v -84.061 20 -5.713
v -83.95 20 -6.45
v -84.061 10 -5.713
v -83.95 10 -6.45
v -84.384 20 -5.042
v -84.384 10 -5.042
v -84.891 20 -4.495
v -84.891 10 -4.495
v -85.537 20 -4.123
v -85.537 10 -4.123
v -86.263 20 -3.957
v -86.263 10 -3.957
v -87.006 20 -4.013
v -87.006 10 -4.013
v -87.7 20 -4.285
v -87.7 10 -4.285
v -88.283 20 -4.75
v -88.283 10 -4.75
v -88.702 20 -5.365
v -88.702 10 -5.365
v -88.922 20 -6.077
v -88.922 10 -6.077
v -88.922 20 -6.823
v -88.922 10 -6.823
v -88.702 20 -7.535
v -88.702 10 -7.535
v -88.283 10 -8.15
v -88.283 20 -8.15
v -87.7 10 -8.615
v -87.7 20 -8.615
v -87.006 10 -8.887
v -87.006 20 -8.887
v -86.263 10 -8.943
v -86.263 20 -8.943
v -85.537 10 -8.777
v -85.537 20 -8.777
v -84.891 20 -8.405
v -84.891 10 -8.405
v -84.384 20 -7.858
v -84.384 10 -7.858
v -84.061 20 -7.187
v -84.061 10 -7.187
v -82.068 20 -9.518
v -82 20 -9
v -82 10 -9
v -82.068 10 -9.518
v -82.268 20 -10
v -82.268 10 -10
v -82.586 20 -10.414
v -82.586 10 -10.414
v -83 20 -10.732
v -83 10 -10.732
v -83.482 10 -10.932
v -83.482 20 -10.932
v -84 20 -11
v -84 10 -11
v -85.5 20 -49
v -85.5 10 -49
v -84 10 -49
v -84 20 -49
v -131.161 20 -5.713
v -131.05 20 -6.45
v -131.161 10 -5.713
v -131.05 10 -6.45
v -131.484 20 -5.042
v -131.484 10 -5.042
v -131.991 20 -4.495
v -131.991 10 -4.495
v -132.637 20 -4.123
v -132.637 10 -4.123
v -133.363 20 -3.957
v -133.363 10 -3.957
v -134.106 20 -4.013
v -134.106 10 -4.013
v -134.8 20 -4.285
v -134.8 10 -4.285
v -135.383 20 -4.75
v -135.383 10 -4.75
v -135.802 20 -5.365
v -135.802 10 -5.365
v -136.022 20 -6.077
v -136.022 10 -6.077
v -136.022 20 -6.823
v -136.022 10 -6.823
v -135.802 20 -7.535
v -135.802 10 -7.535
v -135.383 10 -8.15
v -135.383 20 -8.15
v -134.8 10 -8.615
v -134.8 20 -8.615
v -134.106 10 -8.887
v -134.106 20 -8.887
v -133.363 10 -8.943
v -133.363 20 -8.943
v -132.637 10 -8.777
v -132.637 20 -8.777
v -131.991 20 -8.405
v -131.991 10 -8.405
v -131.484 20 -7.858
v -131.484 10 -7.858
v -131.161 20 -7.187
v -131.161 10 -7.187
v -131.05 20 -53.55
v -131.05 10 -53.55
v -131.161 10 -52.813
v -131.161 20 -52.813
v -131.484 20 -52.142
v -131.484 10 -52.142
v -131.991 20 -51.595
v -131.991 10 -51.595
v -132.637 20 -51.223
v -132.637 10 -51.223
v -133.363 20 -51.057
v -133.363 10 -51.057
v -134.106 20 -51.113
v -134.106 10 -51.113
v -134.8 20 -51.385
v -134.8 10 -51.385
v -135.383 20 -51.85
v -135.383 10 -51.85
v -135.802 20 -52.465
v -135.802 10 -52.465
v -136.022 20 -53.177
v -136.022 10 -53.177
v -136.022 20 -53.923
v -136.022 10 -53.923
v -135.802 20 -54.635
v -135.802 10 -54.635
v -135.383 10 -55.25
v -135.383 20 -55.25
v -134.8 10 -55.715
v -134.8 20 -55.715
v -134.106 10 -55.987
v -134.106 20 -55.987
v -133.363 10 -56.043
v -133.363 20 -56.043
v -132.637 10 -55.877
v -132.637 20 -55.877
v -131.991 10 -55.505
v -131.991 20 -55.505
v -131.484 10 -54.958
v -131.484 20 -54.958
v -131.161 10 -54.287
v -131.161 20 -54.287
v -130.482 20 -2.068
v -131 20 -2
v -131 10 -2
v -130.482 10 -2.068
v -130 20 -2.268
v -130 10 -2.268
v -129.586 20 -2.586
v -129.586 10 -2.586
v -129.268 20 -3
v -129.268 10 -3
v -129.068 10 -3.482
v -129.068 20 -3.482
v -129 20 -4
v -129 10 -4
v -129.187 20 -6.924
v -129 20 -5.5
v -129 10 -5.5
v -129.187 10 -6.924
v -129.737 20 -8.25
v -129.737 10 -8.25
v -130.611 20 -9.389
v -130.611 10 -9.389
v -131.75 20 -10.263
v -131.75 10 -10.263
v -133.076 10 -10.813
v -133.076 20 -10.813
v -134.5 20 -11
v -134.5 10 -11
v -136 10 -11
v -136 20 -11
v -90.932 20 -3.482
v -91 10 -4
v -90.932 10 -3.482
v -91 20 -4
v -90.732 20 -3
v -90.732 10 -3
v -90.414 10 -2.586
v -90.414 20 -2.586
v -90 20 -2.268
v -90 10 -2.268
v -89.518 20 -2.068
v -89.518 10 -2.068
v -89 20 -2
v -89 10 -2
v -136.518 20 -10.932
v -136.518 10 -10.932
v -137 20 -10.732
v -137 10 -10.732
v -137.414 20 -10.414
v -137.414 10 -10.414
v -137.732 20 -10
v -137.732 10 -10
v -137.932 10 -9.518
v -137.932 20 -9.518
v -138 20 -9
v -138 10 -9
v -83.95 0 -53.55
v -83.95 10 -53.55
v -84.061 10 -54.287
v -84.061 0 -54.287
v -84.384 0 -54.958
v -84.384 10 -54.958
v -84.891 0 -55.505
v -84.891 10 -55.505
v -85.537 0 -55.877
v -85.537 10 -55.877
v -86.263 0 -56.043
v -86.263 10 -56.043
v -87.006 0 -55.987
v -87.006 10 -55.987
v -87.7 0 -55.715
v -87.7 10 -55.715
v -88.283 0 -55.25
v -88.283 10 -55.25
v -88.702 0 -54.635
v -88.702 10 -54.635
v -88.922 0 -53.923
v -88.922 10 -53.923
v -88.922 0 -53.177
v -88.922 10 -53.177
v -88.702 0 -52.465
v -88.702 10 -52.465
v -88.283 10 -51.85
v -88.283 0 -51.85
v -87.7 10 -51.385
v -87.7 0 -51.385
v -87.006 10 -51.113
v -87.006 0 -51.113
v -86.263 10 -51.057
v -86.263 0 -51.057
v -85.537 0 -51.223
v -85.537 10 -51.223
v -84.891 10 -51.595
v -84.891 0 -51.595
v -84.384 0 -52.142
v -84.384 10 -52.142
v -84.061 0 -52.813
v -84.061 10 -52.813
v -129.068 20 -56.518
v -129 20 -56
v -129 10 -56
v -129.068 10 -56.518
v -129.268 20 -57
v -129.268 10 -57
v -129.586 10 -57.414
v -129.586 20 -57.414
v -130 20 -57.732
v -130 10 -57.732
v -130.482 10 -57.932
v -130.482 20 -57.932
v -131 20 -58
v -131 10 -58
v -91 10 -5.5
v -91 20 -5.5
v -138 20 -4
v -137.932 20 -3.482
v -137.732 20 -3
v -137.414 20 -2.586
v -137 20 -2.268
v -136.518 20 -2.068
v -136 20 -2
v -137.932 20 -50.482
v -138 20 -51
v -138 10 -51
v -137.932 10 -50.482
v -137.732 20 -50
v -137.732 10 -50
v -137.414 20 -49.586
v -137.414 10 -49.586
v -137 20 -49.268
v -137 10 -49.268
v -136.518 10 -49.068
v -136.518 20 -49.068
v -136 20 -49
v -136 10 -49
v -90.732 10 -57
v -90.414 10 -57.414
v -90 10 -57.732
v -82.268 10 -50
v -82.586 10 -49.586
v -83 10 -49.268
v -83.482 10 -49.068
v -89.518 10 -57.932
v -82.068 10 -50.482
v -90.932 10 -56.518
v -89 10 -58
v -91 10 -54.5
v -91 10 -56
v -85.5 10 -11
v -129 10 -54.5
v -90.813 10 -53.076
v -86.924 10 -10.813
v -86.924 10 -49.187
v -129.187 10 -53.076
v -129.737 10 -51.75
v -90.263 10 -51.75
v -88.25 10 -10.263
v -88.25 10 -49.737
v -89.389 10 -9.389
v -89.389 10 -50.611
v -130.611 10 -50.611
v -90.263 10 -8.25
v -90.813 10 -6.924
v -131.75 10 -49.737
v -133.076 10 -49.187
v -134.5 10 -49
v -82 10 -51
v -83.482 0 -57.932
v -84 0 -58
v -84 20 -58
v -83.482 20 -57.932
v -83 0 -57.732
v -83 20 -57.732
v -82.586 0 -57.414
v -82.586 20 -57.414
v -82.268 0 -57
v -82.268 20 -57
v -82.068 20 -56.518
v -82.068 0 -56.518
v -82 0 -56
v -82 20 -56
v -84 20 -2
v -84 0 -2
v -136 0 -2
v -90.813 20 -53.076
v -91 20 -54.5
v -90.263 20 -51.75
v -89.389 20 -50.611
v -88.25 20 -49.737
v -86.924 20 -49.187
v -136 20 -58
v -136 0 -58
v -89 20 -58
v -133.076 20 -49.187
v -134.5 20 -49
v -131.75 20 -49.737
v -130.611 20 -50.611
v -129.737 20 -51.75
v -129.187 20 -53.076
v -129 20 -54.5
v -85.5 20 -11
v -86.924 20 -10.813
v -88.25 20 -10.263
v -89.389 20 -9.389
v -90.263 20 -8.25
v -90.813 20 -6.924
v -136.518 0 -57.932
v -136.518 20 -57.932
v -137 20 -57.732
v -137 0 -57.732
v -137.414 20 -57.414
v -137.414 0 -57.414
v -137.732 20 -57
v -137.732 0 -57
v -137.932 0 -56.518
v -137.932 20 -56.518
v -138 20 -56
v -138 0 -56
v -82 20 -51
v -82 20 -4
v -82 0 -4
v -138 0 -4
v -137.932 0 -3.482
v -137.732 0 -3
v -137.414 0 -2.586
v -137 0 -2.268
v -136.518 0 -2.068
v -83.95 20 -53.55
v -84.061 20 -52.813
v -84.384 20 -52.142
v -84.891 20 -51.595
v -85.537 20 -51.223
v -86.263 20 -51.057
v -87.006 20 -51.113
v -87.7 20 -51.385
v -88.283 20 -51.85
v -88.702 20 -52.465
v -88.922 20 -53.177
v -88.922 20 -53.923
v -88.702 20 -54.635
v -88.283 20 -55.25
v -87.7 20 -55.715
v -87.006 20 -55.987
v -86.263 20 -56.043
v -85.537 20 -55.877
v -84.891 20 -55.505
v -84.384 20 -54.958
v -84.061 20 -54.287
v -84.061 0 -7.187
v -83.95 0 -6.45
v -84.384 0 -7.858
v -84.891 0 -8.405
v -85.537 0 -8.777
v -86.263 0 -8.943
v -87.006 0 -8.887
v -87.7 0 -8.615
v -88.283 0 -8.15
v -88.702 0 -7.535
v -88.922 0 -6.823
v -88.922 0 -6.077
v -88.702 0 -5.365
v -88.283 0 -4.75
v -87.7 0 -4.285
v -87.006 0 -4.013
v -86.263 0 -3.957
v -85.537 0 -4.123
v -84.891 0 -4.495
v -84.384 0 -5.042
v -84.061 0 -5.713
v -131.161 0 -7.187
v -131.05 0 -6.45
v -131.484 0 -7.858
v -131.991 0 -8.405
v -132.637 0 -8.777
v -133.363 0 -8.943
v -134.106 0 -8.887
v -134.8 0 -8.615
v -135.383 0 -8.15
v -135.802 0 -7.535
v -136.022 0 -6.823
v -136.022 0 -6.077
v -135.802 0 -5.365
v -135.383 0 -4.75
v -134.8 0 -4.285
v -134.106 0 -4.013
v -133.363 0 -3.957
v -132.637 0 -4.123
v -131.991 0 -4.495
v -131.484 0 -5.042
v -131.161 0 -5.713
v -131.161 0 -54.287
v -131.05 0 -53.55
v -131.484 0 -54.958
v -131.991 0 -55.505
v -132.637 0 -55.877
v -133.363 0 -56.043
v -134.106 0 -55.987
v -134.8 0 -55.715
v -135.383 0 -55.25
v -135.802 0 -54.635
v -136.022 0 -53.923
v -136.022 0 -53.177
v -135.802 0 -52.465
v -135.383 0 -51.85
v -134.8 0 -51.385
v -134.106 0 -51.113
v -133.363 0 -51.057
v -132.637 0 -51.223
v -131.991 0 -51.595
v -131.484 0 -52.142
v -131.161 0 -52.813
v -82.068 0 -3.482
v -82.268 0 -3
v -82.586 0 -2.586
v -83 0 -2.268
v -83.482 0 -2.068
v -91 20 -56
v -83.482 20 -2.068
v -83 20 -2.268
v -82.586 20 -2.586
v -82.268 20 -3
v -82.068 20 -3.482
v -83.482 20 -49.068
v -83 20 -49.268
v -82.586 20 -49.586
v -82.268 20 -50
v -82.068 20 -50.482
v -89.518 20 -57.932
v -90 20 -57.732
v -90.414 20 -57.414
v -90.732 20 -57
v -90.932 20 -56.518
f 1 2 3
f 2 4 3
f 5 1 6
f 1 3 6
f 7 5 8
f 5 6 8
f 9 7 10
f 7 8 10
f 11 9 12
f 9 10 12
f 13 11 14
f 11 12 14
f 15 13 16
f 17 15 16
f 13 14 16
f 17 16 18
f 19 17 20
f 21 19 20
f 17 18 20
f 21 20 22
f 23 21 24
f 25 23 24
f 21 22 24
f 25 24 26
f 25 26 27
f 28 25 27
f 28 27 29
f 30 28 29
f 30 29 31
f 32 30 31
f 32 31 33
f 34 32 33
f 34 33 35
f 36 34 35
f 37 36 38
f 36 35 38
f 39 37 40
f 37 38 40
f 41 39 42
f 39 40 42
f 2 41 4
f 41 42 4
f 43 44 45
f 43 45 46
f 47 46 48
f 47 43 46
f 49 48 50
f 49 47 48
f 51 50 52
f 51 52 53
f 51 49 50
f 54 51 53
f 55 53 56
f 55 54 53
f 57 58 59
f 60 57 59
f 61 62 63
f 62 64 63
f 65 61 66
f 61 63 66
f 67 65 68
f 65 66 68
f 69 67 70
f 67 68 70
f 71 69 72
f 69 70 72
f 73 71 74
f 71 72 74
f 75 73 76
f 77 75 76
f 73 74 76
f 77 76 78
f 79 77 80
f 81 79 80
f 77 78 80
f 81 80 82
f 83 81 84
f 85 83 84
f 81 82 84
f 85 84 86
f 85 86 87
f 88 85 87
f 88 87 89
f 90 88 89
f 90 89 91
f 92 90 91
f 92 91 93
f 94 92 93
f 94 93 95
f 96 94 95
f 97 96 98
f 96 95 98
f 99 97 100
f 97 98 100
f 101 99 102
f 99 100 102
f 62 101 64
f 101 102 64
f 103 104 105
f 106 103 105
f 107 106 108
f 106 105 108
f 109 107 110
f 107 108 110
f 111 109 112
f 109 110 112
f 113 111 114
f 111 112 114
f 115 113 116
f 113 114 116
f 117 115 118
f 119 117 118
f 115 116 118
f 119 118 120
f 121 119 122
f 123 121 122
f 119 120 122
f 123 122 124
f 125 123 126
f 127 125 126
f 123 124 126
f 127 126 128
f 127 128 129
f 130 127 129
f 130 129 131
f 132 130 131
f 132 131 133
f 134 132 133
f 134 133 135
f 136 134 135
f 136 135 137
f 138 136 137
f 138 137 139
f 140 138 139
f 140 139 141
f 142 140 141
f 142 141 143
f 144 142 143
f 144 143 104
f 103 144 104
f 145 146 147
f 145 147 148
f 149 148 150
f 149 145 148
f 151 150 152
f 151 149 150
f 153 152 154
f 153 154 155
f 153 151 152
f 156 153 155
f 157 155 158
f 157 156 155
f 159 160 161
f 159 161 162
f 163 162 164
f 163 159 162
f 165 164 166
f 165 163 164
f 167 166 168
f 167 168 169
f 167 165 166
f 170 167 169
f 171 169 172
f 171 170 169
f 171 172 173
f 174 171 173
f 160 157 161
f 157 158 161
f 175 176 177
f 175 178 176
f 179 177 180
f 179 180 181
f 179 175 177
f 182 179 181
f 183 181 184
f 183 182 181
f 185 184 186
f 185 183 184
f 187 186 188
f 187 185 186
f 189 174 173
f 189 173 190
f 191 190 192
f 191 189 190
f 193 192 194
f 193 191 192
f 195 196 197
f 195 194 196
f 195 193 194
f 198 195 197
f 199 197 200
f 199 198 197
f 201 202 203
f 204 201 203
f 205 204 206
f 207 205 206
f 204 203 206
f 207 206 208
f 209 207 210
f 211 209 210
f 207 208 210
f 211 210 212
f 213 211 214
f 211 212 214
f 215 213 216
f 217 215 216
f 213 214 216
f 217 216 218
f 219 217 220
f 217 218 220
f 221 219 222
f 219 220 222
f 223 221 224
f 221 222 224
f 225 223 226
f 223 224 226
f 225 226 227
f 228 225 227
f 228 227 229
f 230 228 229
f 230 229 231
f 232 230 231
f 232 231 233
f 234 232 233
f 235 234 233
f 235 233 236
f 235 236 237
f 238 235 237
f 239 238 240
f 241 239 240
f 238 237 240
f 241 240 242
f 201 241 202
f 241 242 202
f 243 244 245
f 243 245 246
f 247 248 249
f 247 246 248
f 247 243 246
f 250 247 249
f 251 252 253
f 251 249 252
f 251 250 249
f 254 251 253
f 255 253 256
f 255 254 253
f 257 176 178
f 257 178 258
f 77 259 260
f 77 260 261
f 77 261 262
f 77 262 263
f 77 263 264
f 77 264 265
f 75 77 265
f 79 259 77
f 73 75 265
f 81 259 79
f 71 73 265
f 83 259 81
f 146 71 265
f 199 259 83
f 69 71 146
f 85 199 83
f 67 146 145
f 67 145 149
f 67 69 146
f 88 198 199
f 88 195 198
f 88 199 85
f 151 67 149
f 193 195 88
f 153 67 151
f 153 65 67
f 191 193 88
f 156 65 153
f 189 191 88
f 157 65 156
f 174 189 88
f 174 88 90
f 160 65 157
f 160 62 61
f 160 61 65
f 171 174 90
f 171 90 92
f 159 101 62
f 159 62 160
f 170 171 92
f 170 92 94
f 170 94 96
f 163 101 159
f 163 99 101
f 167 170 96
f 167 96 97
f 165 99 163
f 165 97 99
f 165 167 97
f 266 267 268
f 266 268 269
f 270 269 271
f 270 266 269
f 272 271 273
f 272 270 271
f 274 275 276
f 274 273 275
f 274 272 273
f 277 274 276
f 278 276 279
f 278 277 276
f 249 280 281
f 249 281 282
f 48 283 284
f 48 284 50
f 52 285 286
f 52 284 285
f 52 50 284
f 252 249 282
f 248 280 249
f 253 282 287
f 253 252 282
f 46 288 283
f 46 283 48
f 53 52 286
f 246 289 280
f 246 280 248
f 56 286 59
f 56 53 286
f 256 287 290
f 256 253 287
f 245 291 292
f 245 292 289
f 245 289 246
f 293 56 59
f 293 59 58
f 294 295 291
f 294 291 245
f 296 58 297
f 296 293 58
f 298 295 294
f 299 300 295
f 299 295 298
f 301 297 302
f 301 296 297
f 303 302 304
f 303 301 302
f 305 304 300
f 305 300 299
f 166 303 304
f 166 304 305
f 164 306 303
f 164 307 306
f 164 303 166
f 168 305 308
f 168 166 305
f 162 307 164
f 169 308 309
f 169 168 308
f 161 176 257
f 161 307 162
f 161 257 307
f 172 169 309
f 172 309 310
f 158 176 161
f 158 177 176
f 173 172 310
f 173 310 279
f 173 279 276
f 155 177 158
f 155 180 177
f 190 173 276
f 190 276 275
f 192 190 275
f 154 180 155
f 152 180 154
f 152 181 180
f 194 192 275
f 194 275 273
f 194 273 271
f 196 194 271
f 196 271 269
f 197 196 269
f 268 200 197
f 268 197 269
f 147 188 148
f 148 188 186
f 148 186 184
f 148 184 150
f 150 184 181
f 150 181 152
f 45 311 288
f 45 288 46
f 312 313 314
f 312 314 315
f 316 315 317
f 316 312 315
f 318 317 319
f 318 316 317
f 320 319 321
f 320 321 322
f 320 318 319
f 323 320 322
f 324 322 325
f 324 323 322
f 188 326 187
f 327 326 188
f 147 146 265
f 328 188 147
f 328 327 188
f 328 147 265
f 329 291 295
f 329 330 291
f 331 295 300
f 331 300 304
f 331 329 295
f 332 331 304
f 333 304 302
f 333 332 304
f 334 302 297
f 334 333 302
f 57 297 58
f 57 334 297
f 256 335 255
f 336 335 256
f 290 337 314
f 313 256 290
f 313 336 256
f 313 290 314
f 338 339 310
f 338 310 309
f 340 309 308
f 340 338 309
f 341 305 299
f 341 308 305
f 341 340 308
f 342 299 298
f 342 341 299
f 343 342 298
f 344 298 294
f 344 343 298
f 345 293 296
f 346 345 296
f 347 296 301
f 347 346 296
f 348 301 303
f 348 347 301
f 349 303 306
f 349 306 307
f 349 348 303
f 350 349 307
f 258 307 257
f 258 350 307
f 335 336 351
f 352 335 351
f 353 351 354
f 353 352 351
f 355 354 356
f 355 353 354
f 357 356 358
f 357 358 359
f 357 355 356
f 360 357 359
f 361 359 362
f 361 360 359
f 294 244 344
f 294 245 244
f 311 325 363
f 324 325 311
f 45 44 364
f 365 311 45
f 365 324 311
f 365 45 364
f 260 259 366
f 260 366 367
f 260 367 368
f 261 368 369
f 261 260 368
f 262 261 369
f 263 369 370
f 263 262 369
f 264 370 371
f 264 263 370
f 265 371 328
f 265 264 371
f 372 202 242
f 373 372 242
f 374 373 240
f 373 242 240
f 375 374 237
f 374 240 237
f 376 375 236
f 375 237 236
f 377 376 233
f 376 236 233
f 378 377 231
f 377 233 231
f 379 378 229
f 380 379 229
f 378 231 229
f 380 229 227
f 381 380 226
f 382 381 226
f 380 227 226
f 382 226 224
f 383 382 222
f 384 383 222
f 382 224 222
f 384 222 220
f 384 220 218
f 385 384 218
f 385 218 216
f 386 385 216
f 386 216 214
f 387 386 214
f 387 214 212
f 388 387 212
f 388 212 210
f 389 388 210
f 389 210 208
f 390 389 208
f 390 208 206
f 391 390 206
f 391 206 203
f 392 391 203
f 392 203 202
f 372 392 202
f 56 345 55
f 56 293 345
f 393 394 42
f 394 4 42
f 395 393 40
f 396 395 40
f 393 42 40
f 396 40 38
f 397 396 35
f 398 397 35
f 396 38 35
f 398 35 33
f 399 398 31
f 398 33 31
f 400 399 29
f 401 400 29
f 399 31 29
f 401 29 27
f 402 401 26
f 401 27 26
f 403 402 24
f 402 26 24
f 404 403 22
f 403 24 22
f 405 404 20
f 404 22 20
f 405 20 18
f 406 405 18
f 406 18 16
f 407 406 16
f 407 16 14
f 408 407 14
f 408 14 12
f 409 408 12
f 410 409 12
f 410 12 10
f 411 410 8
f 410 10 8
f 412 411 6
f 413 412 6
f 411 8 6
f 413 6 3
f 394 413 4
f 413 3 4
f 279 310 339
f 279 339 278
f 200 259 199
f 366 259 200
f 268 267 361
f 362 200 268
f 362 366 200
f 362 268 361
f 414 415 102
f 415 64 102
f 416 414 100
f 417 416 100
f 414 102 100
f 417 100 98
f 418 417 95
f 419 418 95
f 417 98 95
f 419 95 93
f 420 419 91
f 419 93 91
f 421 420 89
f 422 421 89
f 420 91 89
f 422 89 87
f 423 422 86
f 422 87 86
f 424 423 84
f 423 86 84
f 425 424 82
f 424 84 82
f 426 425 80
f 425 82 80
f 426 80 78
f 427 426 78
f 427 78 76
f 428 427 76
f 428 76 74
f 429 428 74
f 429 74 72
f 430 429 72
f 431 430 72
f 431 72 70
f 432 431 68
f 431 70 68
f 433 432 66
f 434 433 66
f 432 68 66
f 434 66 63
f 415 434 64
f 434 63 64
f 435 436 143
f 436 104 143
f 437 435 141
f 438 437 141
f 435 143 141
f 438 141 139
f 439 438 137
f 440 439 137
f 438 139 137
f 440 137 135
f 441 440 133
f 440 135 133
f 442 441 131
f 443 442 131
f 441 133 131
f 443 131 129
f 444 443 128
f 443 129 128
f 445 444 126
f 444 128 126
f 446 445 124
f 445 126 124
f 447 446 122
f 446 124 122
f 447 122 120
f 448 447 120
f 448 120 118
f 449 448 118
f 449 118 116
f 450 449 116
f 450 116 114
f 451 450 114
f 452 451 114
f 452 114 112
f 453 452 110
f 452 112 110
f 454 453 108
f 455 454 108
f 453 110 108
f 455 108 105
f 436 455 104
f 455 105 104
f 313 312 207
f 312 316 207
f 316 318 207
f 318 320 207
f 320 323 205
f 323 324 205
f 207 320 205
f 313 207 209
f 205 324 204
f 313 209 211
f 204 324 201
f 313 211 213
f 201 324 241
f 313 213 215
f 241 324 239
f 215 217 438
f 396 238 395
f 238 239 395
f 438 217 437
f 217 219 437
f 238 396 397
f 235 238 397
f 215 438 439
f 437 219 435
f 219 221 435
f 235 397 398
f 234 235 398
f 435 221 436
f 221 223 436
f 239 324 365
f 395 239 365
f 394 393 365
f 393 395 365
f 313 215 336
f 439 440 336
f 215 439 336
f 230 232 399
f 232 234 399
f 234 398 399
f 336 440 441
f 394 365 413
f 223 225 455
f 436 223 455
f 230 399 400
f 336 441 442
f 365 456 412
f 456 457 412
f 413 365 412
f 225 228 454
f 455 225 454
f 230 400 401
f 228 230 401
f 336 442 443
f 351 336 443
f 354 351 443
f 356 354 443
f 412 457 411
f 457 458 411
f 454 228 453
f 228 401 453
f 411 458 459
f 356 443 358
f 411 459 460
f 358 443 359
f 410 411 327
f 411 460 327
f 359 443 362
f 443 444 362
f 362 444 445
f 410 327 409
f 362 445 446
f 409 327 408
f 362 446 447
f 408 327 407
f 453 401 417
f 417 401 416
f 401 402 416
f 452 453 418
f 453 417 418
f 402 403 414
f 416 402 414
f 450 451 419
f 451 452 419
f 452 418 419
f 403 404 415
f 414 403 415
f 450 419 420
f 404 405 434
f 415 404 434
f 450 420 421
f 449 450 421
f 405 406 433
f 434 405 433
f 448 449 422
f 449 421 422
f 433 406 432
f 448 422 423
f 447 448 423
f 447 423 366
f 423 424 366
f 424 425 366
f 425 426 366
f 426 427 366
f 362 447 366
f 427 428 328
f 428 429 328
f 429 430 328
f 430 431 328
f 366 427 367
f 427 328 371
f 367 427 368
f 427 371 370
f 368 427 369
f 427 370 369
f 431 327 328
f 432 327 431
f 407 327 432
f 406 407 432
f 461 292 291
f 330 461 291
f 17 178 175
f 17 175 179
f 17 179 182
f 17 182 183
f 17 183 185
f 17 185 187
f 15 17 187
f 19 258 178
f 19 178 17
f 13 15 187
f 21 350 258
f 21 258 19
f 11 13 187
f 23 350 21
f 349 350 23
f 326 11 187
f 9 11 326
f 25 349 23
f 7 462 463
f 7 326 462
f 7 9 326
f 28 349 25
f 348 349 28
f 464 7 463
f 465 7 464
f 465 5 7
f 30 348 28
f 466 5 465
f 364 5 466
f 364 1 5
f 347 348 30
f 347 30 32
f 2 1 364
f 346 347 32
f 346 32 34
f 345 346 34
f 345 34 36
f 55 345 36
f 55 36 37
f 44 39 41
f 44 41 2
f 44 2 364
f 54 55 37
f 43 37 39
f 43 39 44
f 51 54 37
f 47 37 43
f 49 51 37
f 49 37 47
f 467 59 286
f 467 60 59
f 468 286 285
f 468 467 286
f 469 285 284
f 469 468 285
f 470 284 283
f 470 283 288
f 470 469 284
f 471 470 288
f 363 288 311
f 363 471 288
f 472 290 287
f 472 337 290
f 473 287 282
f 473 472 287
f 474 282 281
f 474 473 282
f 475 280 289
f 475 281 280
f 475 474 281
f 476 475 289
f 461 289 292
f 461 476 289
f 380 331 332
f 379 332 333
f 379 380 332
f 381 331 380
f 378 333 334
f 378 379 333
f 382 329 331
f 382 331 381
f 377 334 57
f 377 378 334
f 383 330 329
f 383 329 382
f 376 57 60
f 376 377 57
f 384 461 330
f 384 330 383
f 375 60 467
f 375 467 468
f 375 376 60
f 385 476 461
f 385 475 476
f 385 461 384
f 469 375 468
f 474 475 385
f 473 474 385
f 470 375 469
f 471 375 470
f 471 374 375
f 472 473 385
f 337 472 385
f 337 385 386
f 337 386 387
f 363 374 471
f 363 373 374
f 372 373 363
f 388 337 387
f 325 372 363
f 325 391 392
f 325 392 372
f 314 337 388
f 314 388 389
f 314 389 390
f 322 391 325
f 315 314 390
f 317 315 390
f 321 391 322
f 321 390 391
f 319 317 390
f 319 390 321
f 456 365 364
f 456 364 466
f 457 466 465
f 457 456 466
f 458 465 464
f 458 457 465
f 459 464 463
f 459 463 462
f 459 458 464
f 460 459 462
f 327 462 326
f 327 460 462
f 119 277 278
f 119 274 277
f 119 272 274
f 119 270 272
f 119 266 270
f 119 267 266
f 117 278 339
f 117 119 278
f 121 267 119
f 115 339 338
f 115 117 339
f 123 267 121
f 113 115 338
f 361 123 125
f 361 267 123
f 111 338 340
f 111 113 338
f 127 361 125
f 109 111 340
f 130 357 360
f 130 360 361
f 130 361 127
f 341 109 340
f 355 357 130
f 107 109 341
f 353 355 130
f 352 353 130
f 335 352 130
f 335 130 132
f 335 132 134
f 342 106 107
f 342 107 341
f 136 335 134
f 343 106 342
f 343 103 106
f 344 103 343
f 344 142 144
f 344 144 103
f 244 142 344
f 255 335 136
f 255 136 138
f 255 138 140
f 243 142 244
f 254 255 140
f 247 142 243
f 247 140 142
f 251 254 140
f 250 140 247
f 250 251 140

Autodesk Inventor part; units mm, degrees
ref_plane "YZ Plane" through (0, 0, 0) normal (1, 0, 0) x (0, 1, 0)
ref_plane "XZ Plane" through (0, 0, 0) normal (0, 1, 0) x (-1, 0, 0)
ref_plane "XY Plane" through (0, 0, 0) normal (0, 0, 1) x (1, 0, 0)
sketch "Sketch1" plane through (0, 0, 0) normal (0, 1, 0) x (-1, 0, 0)
  line L0 (140, 0) -> (74, 0)
  line L1 (74, 0) -> (76, 0)
  line L2 (140, 0) -> (140, -60)
  line L3 (140, -60) -> (140, 0)
  line L4 (138, -58) -> (82, -2)
  line L5 (82, -58) -> (138, -2)
  circle A0 centre (110, -30) radius 19.4
  circle A1 centre (104, -30) radius 19.4
  line L6 (110, -30) -> (110, -49.4)
  line L7 (86.45, -6.45) -> (86.45, -53.55)
  line L8 (82, -58) -> (82, -2)
  line L9 (76, -58) -> (76, -2)
  line L10 (74, 0) -> (74, -60)
  line L11 (74, 0) -> (74, -60)
  circle A2 centre (86.45, -6.45) radius 2.5
  line L12 (76, -2) -> (138, -2)
  line L13 (80.45, -8.95) -> (133.55, -8.95)
  line L14 (80.45, -3.95) -> (133.55, -3.95)
  line L15 (133.55, -6.45) -> (86.45, -6.45)
  line L16 (82, -2) -> (138, -2)
  line L17 (104, -10.6) -> (110, -10.6)
  line L18 (138, -2) -> (138, -58)
  line L19 (138, -2) -> (138, -58)
  line L20 (133.55, -53.55) -> (133.55, -6.45)
  line L21 (140, -60) -> (138, -60)
  line L22 (138, -60) -> (138, -58)
  line L23 (138, -58) -> (140, -58)
  line L24 (140, -58) -> (140, -60)
  line L25 (104, -49.4) -> (110, -49.4)
  circle A3 centre (86.45, -53.55) radius 2.5
  line L26 (133.55, -51.05) -> (80.45, -51.05)
  line L27 (86.45, -53.55) -> (133.55, -53.55)
  line L28 (80.45, -56.05) -> (133.55, -56.05)
  line L29 (138, -58) -> (82, -58)
  line L30 (138, -58) -> (76, -58)
  line L31 (74, -60) -> (140, -60)
  line L32 (140, -60) -> (32, -60)
  circle A4 centre (127.55, -53.55) radius 2.5
  line L33 (104, -30) -> (104, -49.4)
  circle A5 centre (80.45, -6.45) radius 2.5
  line L34 (86.45, -53.55) -> (82, -53.55)
  line L35 (82, -58) -> (86.45, -58)
  line L36 (86.45, -58) -> (86.45, -53.55)
  line L37 (82, -53.55) -> (82, -58)
  circle A6 centre (80.45, -53.55) radius 2.5
  circle A7 centre (133.55, -53.55) radius 2.5
  line L38 (76, 0) -> (76, -2)
  line L39 (76, -2) -> (74, -2)
  line L40 (74, -2) -> (74, 0)
  line L41 (138, -2) -> (133.55, -2)
  line L42 (133.55, -2) -> (133.55, -6.45)
  line L43 (133.55, -6.45) -> (138, -6.45)
  line L44 (138, -6.45) -> (138, -2)
  circle A8 centre (127.55, -6.45) radius 2.5
  circle A9 centre (133.55, -6.45) radius 2.5
  line L45 (0, -25) -> (0, 0)
  line L46 (32, -60) -> (0, -25)
  line L47 (0, -25) -> (0, 0)
  line L48 (0, 0) -> (74, 0)
  line L49 (0, 0) -> (74, 0)
  line L50 (140, -60) -> (140, 0)
  line L51 (140, -60) -> (0, -60)
  line L52 (0, -60) -> (0, 0)
  line L53 (0, 0) -> (140, 0)
  line L54 (140, 0) -> (140, -60)
  line L55 (0, -60) -> (40, -60)
  line L56 (40, -60) -> (40, -100)
  line L57 (40, -100) -> (0, -100)
  line L58 (0, -100) -> (0, -60)
  line L59 (138, -58) -> (128.5, -58)
  line L60 (128.5, -58) -> (128.5, -48.5)
  line L61 (128.5, -48.5) -> (138, -48.5)
  line L62 (138, -48.5) -> (138, -58)
  line L63 (82, -58) -> (91.5, -58)
  line L64 (91.5, -58) -> (91.5, -48.5)
  line L65 (91.5, -48.5) -> (82, -48.5)
  line L66 (82, -48.5) -> (82, -58)
  line L67 (138, -2) -> (128.5, -2)
  line L68 (128.5, -2) -> (128.5, -11.5)
  line L69 (128.5, -11.5) -> (138, -11.5)
  line L70 (138, -11.5) -> (138, -2)
  line L71 (82, -2) -> (91.5, -2)
  line L72 (91.5, -2) -> (91.5, -11.5)
  line L73 (91.5, -11.5) -> (82, -11.5)
  line L74 (82, -11.5) -> (82, -2)
  point P0 (127.55, 3.95)
  point P1 (127.55, 8.95)
  point P2 (86.45, 3.95)
  point P3 (86.45, 8.95)
  point P4 (127.55, 56.05)
  point P5 (127.55, 51.05)
  point P6 (86.45, 56.05)
  point P7 (86.45, 51.05)
  point P8 (123.7179, -16.2821)
  point P9 (131.05, -8.95)
  point P10 (88.95, -8.95)
  point P11 (88.2178, -8.2178)
  point P12 (86.45, -8.95)
  point P13 (82, -3.95)
  point P14 (135.3178, -55.3178)
  point P15 (127.55, -56.05)
  point P16 (127.55, -51.05)
  point P17 (131.05, -51.05)
  point P18 (123.7179, -43.7179)
  point P19 (86.45, -51.05)
  point P20 (86.45, -56.05)
  point P21 (86.45, -3.95)
  point P22 (127.55, -8.95)
  point P23 (127.55, -3.95)
  point P24 (86.45, -8.95)
  point P25 (86.45, -3.95)
  point P26 (127.55, -56.05)
  point P27 (127.55, -51.05)
  point P28 (127.55, -8.95)
  point P29 (127.55, -3.95)
  point P30 (86.45, -51.05)
  point P31 (86.45, -56.05)
  dimension "d0" = 40
  dimension "d1" = 40
  dimension "d2" = 9.5
  dimension "d3" = 9.5
  dimension "d4" = 9.5
  dimension "d5" = 9.5
  dimension "d6" = 9.5
  dimension "d7" = 9.5
  dimension "d8" = 9.5
  dimension "d9" = 9.5
extrude "Extrusion1" add sketch "Sketch1" along normal blind 10 contours L29 L60 L28 A7 L4 | L4 A7 L20 L61 L18 | L12 L72 L14 L4 | L4 L14 L8 | A7 L27 L4 | L4 L20 A7 | L61 L20 L69 L18 | L29 L64 L28 L60 | L8 L28 L5 | L5 L28 L36 L29 | L14 A2 L4 | L4 A2 L13 L8 A5 L14 | L12 L68 L14 L72 | L27 A7 L4 | L4 A7 L20 | L28 L60 A4 L27 A7 | L69 L20 A9 L43 L18 | L61 L4 A0 L5 L69 L20 | L20 L26 L4 L61 | L29 L36 L28 L64 | L28 A4 L60 | L28 L8 A6 L34 A3 L5 | L5 A3 L28 | A2 L15 L4 | L4 L7 A2 | L14 L72 L15 A2 | A5 L8 | L12 L42 L14 L68 | L14 A8 L15 L72 | A7 L27 A4 L60 L26 L4 | L4 L26 A7 | L43 A9 L5 L18 | L69 L5 L13 L20 | L60 L26 L64 L5 A1 L25 A0 L4 | L4 L26 L60 | L64 L27 A4 L28 | L28 A3 L27 L64 | A4 L27 L60 | L60 L27 A4 | A3 L34 L5 | L5 L36 A3 | L36 L27 A3 | L8 L34 A6 | L15 A2 L4 | L4 A2 L7 | L13 L4 L73 L7 | L7 L73 L8 L13 | A2 L4 L13 | L15 L72 L13 L4 A2 | L12 L5 A9 L42 | L68 A8 L14 | L14 A9 L15 A8 L68 | A8 L68 L15 | L15 A8 L13 L72 | L27 L60 A4 | A9 L20 L43 | L43 L5 A9 | A9 L5 L20 | L13 L5 A9 | L68 L13 L5 | L5 A0 L17 A1 L4 L72 L13 L68 | A0 L6 A1 L4 | L4 A1 L5 A0 | L60 A4 L26 | L64 L26 A4 L27 | L27 A3 L5 L26 L64 | A4 L60 L27 | L7 A3 L5 | L34 A3 L7 | L5 A3 L27 | L34 A6 L8 L26 A3 | L8 A6 L34 | L73 L4 A1 L7 | L7 A1 L65 L8 L73 | L13 L72 L4 | A9 L5 L42 | L42 L15 A9 | A8 L15 L68 | L15 L68 A8 | L5 A9 L15 | L13 L68 A8 L15 A9 L5 | L5 A1 A0 | L13 A8 L68 | A1 L6 L4 | L4 L5 A1 | L25 A1 A0 | A0 A1 L6 | L26 L5 L64 | A3 L26 L5 | L26 L8 L65 L7 | L7 L65 L5 L26 | L7 A1 | A1 L4 A0 L5 L7 | A8 L68 L15 | L5 L4 A0 A1 | A0 A1 L17 | L5 A0 L4 | L6 A1 A0 L33 L5 | A1 L33 A0 | A1 L5 A0 L33 | L65 L7 A1 L5 | A1 A0 L4 | L33 A0 L5 picked at (82.1331, -6.9717)
sketch "Sketch2" plane through (0, 10, 0) normal (0, 1, 0) x (1, 0, 0)
  line L0 (-82, 58) -> (-138, 58) projected
  line L1 (-138, 2) -> (-82, 2) projected
  line L2 (-138, 58) -> (-82, 58)
  line L3 (-82, 58) -> (-82, 2)
  line L4 (-82, 2) -> (-138, 2)
  line L5 (-138, 2) -> (-138, 58)
  line L6 (-138, 58) -> (-138, 2) projected
  line L7 (-138, 58) -> (-129, 58)
  line L8 (-129, 58) -> (-129, 49)
  line L9 (-129, 49) -> (-138, 49)
  line L10 (-138, 49) -> (-138, 58)
  line L11 (-82, 58) -> (-91, 58)
  line L12 (-91, 58) -> (-91, 49)
  line L13 (-91, 49) -> (-82, 49)
  line L14 (-82, 49) -> (-82, 58)
  line L15 (-138, 2) -> (-129, 2)
  line L16 (-129, 2) -> (-129, 11)
  line L17 (-129, 11) -> (-138, 11)
  line L18 (-138, 11) -> (-138, 2)
  line L19 (-82, 2) -> (-91, 2)
  line L20 (-91, 2) -> (-91, 11)
  line L21 (-91, 11) -> (-82, 11)
  line L22 (-82, 11) -> (-82, 2)
  line L23 (-140, 0) -> (-74, 0)
  line L24 (-74, 0) -> (-76, 0)
  line L25 (-140, 0) -> (-140, 60)
  line L26 (-140, 60) -> (-140, 0)
  line L27 (-138, 58) -> (-82, 2)
  line L28 (-82, 58) -> (-138, 2)
  circle A0 centre (-110, 30) radius 19.4
  circle A1 centre (-104, 30) radius 19.4
  line L29 (-110, 30) -> (-110, 49.4)
  line L30 (-86.45, 6.45) -> (-86.45, 53.55)
  line L31 (-82, 58) -> (-82, 2)
  line L32 (-76, 58) -> (-76, 2)
  line L33 (-74, 0) -> (-74, 60)
  line L34 (-74, 0) -> (-74, 60)
  circle A2 centre (-86.45, 6.45) radius 2.5
  line L35 (-76, 2) -> (-138, 2)
  line L36 (-80.45, 8.95) -> (-133.55, 8.95)
  line L37 (-80.45, 3.95) -> (-133.55, 3.95)
  line L38 (-133.55, 6.45) -> (-86.45, 6.45)
  line L39 (-82, 2) -> (-138, 2)
  line L40 (-104, 10.6) -> (-110, 10.6)
  line L41 (-138, 2) -> (-138, 58)
  line L42 (-138, 2) -> (-138, 58)
  line L43 (-133.55, 53.55) -> (-133.55, 6.45)
  line L44 (-140, 60) -> (-138, 60)
  line L45 (-138, 60) -> (-138, 58)
  line L46 (-138, 58) -> (-140, 58)
  line L47 (-140, 58) -> (-140, 60)
  line L48 (-104, 49.4) -> (-110, 49.4)
  circle A3 centre (-86.45, 53.55) radius 2.5
  line L49 (-133.55, 51.05) -> (-80.45, 51.05)
  line L50 (-86.45, 53.55) -> (-133.55, 53.55)
  line L51 (-80.45, 56.05) -> (-133.55, 56.05)
  line L52 (-138, 58) -> (-82, 58)
  line L53 (-138, 58) -> (-76, 58)
  line L54 (-74, 60) -> (-140, 60)
  line L55 (-140, 60) -> (-32, 60)
  circle A4 centre (-127.55, 53.55) radius 2.5
  line L56 (-104, 30) -> (-104, 49.4)
  circle A5 centre (-80.45, 6.45) radius 2.5
  line L57 (-86.45, 53.55) -> (-82, 53.55)
  line L58 (-82, 58) -> (-86.45, 58)
  line L59 (-86.45, 58) -> (-86.45, 53.55)
  line L60 (-82, 53.55) -> (-82, 58)
  circle A6 centre (-80.45, 53.55) radius 2.5
  circle A7 centre (-133.55, 53.55) radius 2.5
  line L61 (-76, 0) -> (-76, 2)
  line L62 (-76, 2) -> (-74, 2)
  line L63 (-74, 2) -> (-74, 0)
  line L64 (-138, 2) -> (-133.55, 2)
  line L65 (-133.55, 2) -> (-133.55, 6.45)
  line L66 (-133.55, 6.45) -> (-138, 6.45)
  line L67 (-138, 6.45) -> (-138, 2)
  circle A8 centre (-127.55, 6.45) radius 2.5
  circle A9 centre (-133.55, 6.45) radius 2.5
  line L68 (0, 25) -> (0, 0)
  line L69 (-32, 60) -> (0, 25)
  line L70 (0, 25) -> (0, 0)
  line L71 (0, 0) -> (-74, 0)
  line L72 (0, 0) -> (-74, 0)
  line L73 (-140, 60) -> (-140, 0)
  line L74 (-140, 60) -> (0, 60)
  line L75 (0, 60) -> (0, 0)
  line L76 (0, 0) -> (-140, 0)
  line L77 (-140, 0) -> (-140, 60)
  line L78 (0, 60) -> (-40, 60)
  line L79 (-40, 60) -> (-40, 100)
  line L80 (-40, 100) -> (0, 100)
  line L81 (0, 100) -> (0, 60)
  line L82 (-138, 58) -> (-128.5, 58)
  line L83 (-128.5, 58) -> (-128.5, 48.5)
  line L84 (-128.5, 48.5) -> (-138, 48.5)
  line L85 (-138, 48.5) -> (-138, 58)
  line L86 (-82, 58) -> (-91.5, 58)
  line L87 (-91.5, 58) -> (-91.5, 48.5)
  line L88 (-91.5, 48.5) -> (-82, 48.5)
  line L89 (-82, 48.5) -> (-82, 58)
  line L90 (-138, 2) -> (-128.5, 2)
  line L91 (-128.5, 2) -> (-128.5, 11.5)
  line L92 (-128.5, 11.5) -> (-138, 11.5)
  line L93 (-138, 11.5) -> (-138, 2)
  line L94 (-82, 2) -> (-91.5, 2)
  line L95 (-91.5, 2) -> (-91.5, 11.5)
  line L96 (-91.5, 11.5) -> (-82, 11.5)
  line L97 (-82, 11.5) -> (-82, 2)
  point P0 (127.55, 3.95)
  point P1 (127.55, 8.95)
  point P2 (86.45, 3.95)
  point P3 (86.45, 8.95)
  point P4 (127.55, 56.05)
  point P5 (127.55, 51.05)
  point P6 (86.45, 56.05)
  point P7 (86.45, 51.05)
  point P8 (123.7179, -16.2821)
  point P9 (131.05, -8.95)
  point P10 (88.95, -8.95)
  point P11 (88.2178, -8.2178)
  point P12 (86.45, -8.95)
  point P13 (82, -3.95)
  point P14 (82, -2)
  point P15 (74, -2)
  point P16 (138, -60)
  point P17 (135.3178, -55.3178)
  point P18 (127.55, -56.05)
  point P19 (127.55, -51.05)
  point P20 (131.05, -51.05)
  point P21 (123.7179, -43.7179)
  point P22 (86.45, -51.05)
  point P23 (86.45, -56.05)
  point P24 (86.45, -3.95)
  point P25 (127.55, -8.95)
  point P26 (127.55, -3.95)
  point P27 (0, -25)
  point P28 (40, -60)
  point P29 (86.45, -8.95)
  point P30 (86.45, -3.95)
  point P31 (127.55, -56.05)
  point P32 (127.55, -51.05)
  point P33 (127.55, -8.95)
  point P34 (127.55, -3.95)
  point P35 (0, -25)
  point P36 (40, -60)
  point P37 (138, -60)
  point P38 (86.45, -51.05)
  point P39 (86.45, -56.05)
  point P40 (82, -2)
  point P41 (-91, 2)
  point P42 (-82, 11)
  point P43 (-138, 11)
  point P44 (-129, 2)
  dimension "d12" = 9
  dimension "d13" = 9
  dimension "d14" = 9
  dimension "d15" = 9
  dimension "d16" = 9
  dimension "d17" = 9
  dimension "d18" = 9
  dimension "d19" = 9
  dimension "d20" = 40
  dimension "d21" = 40
  dimension "d22" = 9.5
  dimension "d23" = 9.5
  dimension "d24" = 9.5
  dimension "d25" = 9.5
  dimension "d26" = 9.5
  dimension "d27" = 9.5
  dimension "d28" = 9.5
  dimension "d29" = 9.5
extrude "Extrusion2" add sketch "Sketch2" along normal blind 10 contours L28 L51 L59 L0 | L3 L51 L28 | L59 L51 L12 L0 | L3 A6 L57 A3 L28 L51 | L28 A3 L51 | A3 L50 L12 L51 | L3 L57 A6 | A3 L28 L49 L12 L50 | L3 A6 L57 | A6 L3 L49 A3 L57 | L27 L37 L3 | L1 L20 L37 L27 | A3 L49 L28 | L49 L3 L13 L30 | L30 L13 L28 L49 | L37 L27 A2 L36 L3 A5 | L37 A2 L27 | L8 L51 A7 L27 L0 | L49 L28 L12 | L20 L38 A2 L37 | A5 L3 | L27 A7 L43 L9 L5 | L8 A4 L50 A7 L51 | L20 L36 L27 A2 L38 | L8 L50 A4 | L1 L65 L37 L16 | L20 L27 L36 | L36 L30 L21 L3 | L27 L36 A2 | L36 L27 L21 L30 | L43 L49 L27 L9 | A7 L27 L49 | L8 A4 L50 | A4 L8 L49 L27 A7 L50 | L1 L28 A9 L65 | L37 A9 L38 A8 L16 | L27 L49 L8 | L5 L66 A9 L28 | A8 L38 L16 | L17 L43 A9 L66 L5 | A9 L28 L36 L16 A8 L38 | L38 A8 L16 | L17 L28 L36 L43 | A9 L36 L28 | L36 L28 L16 picked at (-82.2333, 6.0868)
fillet "Fillet1" radius 5.5 4 edges at (-91, 15, -49) (-129, 15, -49) (-129, 15, -11) (-91, 15, -11)
fillet "Fillet2" radius 2 12 edges at (-82, 10, -2) (-138, 10, -2) (-138, 10, -58) (-82, 10, -58) (-91, 15, -58) (-82, 15, -49) (-129, 15, -58) (-138, 15, -49) (-138, 15, -11) (-129, 15, -2) (-91, 15, -2) (-82, 15, -11)
sketch "Sketch3" plane through (0, 20, 0) normal (0, 1, 0) x (1, 0, 0)
  circle A0 centre (-133.55, 53.55) radius 2.5 projected
  circle A1 centre (-133.55, 53.55) radius 2.5
  circle A2 centre (-86.45, 53.55) radius 2.5 projected
  circle A3 centre (-86.45, 53.55) radius 2.5
  circle A4 centre (-133.55, 6.45) radius 2.5 projected
  circle A5 centre (-133.55, 6.45) radius 2.5
  circle A6 centre (-86.45, 6.45) radius 2.5 projected
  circle A7 centre (-86.45, 6.45) radius 2.5
  point P0 (0, 0)
extrude "Extrusion3" cut sketch "Sketch3" against normal through all
properties part number "duzy_silnik_tyl"
